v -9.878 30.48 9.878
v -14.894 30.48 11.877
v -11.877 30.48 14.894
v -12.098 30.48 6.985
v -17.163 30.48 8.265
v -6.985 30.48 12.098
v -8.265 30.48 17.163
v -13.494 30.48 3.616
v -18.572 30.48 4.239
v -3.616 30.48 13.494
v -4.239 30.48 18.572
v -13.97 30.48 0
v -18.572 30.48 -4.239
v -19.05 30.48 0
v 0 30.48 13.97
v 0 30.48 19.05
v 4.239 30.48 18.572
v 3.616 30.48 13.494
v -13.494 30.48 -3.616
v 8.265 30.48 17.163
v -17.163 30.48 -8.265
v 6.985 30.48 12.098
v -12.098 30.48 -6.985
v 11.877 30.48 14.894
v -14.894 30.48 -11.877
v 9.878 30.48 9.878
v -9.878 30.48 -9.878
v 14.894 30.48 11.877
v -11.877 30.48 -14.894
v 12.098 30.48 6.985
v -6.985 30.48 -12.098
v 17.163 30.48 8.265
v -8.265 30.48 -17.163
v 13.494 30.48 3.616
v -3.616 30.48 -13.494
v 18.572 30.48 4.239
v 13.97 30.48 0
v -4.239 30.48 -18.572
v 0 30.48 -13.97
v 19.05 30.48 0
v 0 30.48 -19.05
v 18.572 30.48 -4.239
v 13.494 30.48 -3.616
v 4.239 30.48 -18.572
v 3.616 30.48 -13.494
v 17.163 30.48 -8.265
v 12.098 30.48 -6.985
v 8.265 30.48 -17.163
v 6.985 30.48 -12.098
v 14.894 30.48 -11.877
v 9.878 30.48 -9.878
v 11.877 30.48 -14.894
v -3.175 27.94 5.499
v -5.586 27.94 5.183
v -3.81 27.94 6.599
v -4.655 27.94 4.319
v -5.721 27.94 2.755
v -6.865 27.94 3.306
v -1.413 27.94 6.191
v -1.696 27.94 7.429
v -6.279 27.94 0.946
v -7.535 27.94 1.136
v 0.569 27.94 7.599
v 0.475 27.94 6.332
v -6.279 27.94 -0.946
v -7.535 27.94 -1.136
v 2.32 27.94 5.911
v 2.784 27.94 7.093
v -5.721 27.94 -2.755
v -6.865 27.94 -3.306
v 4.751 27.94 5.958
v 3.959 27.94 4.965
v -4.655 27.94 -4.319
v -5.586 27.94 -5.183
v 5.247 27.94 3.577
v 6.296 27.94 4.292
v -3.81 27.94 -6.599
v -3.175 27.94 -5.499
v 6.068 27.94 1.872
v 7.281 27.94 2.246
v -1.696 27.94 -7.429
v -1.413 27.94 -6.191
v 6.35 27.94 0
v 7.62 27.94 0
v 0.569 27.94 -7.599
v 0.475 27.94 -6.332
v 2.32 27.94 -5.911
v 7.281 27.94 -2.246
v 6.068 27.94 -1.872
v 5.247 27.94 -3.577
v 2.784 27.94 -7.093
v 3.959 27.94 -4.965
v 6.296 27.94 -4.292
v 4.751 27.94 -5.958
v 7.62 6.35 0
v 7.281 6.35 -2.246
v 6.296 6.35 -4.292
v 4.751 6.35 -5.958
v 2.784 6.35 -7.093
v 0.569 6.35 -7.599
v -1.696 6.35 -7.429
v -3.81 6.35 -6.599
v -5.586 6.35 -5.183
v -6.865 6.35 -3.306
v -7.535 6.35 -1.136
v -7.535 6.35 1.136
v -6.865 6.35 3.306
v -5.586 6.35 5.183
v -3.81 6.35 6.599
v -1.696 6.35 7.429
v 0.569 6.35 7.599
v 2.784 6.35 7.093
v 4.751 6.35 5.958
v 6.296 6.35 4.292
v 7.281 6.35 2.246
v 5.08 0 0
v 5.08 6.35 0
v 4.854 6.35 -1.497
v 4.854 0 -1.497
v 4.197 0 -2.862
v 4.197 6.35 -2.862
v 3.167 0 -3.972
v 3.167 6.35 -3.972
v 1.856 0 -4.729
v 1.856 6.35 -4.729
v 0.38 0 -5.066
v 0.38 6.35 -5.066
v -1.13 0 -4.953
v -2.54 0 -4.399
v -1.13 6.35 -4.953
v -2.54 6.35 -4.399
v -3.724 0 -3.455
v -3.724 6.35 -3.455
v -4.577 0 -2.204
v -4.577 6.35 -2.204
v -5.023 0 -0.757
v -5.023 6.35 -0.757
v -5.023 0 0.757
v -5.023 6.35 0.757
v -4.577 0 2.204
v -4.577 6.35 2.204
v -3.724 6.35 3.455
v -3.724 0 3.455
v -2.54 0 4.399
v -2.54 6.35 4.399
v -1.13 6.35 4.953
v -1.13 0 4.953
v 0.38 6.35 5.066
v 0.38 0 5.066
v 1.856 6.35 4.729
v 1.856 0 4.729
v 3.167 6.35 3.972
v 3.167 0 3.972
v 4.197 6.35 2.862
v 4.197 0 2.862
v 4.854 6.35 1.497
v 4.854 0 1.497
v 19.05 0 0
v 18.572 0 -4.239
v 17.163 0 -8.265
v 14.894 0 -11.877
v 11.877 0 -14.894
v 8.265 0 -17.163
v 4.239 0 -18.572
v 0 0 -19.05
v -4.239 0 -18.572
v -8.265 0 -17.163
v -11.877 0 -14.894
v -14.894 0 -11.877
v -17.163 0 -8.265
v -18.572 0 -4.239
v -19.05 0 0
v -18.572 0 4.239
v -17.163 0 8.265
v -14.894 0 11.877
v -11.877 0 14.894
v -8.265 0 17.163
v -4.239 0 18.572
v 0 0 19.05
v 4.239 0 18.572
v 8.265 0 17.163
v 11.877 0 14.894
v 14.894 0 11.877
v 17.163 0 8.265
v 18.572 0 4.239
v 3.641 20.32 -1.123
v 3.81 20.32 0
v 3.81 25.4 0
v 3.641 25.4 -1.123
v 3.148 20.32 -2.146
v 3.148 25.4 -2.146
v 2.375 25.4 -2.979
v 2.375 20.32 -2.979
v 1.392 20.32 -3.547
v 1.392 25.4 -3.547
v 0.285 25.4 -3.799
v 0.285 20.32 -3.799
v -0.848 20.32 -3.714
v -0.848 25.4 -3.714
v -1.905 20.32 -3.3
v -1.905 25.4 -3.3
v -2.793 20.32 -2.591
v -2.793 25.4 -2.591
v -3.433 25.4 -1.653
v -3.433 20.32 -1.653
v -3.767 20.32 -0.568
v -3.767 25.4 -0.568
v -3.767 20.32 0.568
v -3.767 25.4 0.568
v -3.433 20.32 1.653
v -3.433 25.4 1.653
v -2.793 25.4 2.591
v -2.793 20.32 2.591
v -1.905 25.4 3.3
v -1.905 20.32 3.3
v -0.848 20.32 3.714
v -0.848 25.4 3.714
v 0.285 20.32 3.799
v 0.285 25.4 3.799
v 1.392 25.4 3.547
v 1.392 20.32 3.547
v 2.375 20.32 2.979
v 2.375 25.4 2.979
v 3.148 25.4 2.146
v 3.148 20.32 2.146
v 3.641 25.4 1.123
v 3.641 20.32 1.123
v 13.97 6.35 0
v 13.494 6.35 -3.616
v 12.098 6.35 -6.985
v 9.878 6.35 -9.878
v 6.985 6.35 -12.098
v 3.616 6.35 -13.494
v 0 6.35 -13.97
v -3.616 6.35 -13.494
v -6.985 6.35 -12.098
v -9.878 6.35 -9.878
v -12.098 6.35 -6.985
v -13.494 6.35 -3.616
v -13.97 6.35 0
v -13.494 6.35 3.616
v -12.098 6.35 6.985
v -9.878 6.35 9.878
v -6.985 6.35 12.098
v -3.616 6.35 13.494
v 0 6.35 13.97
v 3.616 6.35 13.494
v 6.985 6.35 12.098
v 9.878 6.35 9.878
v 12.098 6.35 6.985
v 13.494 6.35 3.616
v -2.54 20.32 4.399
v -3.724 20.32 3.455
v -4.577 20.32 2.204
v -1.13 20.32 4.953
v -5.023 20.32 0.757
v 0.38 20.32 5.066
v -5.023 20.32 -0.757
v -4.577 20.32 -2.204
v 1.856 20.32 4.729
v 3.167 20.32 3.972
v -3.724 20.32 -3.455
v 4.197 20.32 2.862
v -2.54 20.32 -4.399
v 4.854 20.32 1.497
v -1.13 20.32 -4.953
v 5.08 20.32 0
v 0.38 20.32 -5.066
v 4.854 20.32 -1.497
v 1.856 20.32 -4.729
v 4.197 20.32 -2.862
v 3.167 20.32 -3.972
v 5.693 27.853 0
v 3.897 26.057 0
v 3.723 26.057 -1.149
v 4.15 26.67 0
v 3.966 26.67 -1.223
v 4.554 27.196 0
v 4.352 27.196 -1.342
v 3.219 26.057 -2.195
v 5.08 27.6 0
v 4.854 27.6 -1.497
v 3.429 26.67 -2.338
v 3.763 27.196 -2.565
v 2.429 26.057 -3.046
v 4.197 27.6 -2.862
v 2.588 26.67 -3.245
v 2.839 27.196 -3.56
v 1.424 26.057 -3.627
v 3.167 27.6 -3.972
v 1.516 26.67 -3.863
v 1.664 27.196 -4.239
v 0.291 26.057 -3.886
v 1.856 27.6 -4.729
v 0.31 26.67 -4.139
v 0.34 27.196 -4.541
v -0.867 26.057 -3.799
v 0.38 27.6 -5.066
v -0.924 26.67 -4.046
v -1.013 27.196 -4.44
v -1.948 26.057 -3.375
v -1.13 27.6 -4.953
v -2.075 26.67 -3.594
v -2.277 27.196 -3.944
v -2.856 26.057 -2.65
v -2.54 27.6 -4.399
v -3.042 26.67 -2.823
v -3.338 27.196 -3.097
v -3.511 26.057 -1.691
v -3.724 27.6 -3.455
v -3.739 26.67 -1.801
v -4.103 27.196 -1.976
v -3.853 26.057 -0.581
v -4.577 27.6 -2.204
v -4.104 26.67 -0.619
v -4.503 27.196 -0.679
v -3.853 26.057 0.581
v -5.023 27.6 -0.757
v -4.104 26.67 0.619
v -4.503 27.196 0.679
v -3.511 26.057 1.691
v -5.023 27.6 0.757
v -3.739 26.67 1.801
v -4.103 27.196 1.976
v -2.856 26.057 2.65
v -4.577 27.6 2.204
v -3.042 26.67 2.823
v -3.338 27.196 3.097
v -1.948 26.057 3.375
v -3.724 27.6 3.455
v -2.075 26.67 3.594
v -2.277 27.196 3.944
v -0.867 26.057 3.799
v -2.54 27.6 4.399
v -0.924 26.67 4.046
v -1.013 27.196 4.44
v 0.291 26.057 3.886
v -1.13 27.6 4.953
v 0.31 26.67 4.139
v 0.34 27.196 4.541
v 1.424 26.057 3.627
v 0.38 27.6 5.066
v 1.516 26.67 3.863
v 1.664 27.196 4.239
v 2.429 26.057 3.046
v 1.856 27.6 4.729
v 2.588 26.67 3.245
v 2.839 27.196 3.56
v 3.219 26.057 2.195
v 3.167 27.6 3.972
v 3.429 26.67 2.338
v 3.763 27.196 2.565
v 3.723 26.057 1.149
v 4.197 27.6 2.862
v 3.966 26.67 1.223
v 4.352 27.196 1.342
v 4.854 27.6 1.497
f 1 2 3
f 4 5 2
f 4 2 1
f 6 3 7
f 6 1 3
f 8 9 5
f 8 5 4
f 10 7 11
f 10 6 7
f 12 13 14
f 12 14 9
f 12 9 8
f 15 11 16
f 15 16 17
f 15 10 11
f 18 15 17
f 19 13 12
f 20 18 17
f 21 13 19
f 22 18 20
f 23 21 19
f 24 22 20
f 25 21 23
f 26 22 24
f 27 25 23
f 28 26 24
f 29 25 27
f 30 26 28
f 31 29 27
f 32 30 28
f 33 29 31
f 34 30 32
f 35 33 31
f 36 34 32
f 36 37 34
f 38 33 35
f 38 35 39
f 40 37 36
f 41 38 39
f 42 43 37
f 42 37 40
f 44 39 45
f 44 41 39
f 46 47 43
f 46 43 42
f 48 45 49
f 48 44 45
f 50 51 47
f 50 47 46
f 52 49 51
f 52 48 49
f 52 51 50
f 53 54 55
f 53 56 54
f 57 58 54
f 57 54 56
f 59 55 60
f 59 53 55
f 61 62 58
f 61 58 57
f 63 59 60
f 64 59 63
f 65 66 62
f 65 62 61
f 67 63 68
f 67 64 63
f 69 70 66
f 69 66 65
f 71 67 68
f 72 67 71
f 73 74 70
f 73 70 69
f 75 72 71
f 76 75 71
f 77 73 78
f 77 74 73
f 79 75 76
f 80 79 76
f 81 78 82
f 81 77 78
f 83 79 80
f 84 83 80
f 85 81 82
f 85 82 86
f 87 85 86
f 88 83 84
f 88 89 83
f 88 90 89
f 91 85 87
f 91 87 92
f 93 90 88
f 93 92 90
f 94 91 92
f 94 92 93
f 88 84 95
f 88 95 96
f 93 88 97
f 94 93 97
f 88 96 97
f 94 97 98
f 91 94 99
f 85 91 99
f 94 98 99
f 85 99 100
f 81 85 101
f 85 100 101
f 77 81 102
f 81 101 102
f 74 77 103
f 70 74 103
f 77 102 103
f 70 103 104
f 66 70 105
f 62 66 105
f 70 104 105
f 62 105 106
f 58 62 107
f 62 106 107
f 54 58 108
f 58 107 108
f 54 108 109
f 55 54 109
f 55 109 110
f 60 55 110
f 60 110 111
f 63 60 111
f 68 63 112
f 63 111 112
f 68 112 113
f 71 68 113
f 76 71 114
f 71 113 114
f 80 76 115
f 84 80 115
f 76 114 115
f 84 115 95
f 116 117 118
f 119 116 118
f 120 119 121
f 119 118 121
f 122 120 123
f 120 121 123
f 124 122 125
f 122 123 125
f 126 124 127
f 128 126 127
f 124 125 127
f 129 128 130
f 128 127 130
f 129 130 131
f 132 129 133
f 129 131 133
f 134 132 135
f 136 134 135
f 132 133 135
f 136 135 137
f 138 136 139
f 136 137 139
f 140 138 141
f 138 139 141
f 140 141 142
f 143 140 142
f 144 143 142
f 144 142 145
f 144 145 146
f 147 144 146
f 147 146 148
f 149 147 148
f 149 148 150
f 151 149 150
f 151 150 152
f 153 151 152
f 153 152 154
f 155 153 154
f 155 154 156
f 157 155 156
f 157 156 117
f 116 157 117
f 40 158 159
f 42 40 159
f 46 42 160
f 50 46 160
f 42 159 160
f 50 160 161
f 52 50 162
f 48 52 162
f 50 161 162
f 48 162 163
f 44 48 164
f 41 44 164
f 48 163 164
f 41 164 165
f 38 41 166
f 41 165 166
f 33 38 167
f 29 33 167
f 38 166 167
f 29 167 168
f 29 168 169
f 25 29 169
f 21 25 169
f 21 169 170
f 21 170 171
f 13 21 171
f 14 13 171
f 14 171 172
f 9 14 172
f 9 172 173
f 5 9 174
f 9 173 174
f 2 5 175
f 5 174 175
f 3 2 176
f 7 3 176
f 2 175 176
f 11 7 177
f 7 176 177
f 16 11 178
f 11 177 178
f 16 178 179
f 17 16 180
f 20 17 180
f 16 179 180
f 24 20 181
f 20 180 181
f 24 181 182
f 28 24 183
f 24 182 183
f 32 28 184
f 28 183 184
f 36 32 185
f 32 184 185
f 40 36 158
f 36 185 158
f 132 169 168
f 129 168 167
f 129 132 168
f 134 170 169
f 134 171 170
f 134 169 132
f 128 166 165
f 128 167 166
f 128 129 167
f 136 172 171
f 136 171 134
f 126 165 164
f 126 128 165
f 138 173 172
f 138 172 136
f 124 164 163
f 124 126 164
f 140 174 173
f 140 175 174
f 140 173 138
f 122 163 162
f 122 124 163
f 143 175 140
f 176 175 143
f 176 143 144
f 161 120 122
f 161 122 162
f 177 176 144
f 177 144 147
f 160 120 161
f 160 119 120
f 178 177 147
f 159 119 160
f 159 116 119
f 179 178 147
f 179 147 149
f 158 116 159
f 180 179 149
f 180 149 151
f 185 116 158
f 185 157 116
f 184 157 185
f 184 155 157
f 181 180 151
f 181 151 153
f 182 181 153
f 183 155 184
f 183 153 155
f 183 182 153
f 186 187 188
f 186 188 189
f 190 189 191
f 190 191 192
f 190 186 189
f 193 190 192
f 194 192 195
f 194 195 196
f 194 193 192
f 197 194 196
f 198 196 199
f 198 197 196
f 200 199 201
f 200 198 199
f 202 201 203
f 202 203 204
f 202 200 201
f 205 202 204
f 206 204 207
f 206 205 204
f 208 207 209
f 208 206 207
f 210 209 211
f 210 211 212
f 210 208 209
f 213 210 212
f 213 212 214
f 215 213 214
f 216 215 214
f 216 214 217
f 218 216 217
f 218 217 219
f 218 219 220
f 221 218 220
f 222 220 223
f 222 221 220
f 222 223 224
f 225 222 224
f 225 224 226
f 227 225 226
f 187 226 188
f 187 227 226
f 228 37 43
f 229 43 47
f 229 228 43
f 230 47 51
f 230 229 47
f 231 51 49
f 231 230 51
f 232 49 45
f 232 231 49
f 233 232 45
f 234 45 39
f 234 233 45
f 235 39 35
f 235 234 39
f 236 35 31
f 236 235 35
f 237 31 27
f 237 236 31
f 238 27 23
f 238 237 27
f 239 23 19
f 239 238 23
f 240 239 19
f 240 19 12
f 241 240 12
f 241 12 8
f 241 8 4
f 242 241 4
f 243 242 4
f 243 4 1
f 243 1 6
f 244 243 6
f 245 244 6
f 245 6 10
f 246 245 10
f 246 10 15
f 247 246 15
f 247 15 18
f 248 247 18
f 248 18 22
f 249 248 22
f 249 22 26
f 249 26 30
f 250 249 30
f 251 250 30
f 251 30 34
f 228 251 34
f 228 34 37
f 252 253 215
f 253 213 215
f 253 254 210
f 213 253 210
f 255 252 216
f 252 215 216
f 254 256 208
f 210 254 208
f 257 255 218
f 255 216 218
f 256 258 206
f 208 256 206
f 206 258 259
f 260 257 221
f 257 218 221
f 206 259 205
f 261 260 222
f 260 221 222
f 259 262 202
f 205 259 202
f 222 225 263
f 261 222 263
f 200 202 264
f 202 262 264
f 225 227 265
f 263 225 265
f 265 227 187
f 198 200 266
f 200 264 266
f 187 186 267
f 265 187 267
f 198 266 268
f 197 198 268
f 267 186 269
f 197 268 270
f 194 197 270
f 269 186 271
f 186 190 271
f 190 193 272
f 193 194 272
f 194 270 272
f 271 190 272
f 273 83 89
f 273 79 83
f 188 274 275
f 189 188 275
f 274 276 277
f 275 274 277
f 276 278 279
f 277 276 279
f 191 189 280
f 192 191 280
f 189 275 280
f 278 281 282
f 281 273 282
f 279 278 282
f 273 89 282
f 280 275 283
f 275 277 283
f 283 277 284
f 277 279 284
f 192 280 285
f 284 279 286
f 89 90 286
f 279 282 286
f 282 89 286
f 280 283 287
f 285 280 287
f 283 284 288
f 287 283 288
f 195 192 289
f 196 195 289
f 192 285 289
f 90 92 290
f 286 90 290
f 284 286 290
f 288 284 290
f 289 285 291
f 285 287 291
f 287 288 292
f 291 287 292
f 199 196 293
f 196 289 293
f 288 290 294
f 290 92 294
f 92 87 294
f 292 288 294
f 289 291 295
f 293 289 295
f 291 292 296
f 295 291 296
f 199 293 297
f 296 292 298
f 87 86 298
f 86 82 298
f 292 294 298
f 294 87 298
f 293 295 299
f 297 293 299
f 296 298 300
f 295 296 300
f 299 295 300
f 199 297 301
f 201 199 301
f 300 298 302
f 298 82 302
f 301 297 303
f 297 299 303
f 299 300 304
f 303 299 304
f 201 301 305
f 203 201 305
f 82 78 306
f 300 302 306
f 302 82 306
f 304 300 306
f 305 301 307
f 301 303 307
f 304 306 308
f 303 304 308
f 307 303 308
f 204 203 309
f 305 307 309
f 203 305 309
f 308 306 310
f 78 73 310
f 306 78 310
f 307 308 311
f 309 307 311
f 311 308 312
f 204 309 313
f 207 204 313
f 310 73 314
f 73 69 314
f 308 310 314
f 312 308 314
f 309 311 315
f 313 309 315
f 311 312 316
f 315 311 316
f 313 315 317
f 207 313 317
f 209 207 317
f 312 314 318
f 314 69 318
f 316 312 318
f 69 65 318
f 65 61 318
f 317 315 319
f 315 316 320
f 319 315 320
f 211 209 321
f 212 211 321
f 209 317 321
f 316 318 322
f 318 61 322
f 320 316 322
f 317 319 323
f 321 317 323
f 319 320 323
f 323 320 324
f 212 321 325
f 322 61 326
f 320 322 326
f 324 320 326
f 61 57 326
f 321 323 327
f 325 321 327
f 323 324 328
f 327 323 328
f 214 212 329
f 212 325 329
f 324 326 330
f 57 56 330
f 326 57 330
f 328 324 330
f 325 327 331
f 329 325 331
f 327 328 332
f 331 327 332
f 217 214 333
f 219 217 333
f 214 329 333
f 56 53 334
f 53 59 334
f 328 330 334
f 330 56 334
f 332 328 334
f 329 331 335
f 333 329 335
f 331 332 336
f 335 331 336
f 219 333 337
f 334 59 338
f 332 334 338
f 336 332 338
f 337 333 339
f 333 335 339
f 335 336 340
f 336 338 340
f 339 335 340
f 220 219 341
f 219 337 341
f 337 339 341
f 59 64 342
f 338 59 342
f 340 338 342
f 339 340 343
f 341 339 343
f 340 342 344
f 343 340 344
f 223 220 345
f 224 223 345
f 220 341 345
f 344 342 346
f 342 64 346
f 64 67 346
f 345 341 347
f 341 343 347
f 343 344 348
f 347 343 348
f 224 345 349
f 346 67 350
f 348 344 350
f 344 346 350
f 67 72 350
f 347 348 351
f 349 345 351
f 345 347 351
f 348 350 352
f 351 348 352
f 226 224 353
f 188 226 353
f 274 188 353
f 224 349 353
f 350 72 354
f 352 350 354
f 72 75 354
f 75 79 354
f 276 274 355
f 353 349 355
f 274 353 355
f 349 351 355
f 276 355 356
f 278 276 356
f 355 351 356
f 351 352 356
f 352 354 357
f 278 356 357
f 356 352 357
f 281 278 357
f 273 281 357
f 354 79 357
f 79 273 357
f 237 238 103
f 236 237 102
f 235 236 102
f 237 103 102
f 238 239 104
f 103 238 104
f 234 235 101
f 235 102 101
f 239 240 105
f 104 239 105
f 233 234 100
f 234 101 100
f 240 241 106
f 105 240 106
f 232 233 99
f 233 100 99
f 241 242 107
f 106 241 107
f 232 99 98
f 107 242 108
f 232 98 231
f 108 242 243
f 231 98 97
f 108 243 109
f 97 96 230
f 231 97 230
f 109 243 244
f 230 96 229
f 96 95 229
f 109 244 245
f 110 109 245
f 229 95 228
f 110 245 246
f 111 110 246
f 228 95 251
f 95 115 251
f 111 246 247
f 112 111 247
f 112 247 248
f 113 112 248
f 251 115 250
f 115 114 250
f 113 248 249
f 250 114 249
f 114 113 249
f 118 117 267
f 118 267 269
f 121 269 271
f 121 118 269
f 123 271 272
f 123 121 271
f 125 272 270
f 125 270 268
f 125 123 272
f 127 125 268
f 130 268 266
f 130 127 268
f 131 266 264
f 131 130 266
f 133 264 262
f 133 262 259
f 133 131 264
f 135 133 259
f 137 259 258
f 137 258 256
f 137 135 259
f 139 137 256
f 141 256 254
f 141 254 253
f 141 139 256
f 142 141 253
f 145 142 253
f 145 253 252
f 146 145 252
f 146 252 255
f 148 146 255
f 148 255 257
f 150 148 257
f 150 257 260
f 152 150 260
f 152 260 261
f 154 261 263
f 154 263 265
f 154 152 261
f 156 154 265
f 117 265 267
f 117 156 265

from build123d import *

# Parameters (mm, degrees)
SKETCH1_R           = 19.05
SKETCH1_R_2         = 13.97
BOSS_EXTRUDE1_DEPTH = 30.48
SKETCH2_R           = 13.97
BOSS_EXTRUDE2_DEPTH = 6.35
SKETCH7_R           = 5.08
CUT_EXTRUDE4_DEPTH  = 7.35
SKETCH9_R           = 7.62
SKETCH9_R_2         = 5.08
BOSS_EXTRUDE3_DEPTH = 13.97
SKETCH10_R          = 7.62
SKETCH10_R_2        = 3.81
BOSS_EXTRUDE4_DEPTH = 7.62
FILLET1_R           = 2.54


with BuildPart() as part:
    # Sketch1 → Boss-Extrude1 (new body)
    with BuildSketch(Plane(origin=(0, 0, 0), x_dir=(1, 0, 0), z_dir=(0, 1, 0))):
        Circle(SKETCH1_R)
        Circle(SKETCH1_R_2, mode=Mode.SUBTRACT)
    extrude(amount=BOSS_EXTRUDE1_DEPTH)

    # Sketch2 → Boss-Extrude2 (add)
    with BuildSketch(Plane.XZ):
        Circle(SKETCH2_R)
    extrude(amount=-BOSS_EXTRUDE2_DEPTH)

    # Sketch7 → Cut-Extrude4 (cut, through all)
    with BuildSketch(Plane(origin=(0, 6.35, 0), x_dir=(1, 0, 0), z_dir=(0, 1, 0))):
        Circle(SKETCH7_R)
    extrude(amount=-CUT_EXTRUDE4_DEPTH, mode=Mode.SUBTRACT)

    # Sketch9 → Boss-Extrude3 (add)
    with BuildSketch(Plane(origin=(0, 6.35, 0), x_dir=(1, 0, 0), z_dir=(0, 1, 0))):
        Circle(SKETCH9_R)
        Circle(SKETCH9_R_2, mode=Mode.SUBTRACT)
    extrude(amount=BOSS_EXTRUDE3_DEPTH)

    # Sketch10 → Boss-Extrude4 (add)
    with BuildSketch(Plane(origin=(0, 20.32, 0), x_dir=(1, 0, 0), z_dir=(0, 1, 0))):
        Circle(SKETCH10_R)
        Circle(SKETCH10_R_2, mode=Mode.SUBTRACT)
    extrude(amount=BOSS_EXTRUDE4_DEPTH)

    # Fillet1
    fillet1_edges = [part.edges().sort_by_distance(p)[0] for p in [
        (-3.81, 27.94, 0),
    ]]
    fillet(fillet1_edges, radius=FILLET1_R)


solid = part.part
